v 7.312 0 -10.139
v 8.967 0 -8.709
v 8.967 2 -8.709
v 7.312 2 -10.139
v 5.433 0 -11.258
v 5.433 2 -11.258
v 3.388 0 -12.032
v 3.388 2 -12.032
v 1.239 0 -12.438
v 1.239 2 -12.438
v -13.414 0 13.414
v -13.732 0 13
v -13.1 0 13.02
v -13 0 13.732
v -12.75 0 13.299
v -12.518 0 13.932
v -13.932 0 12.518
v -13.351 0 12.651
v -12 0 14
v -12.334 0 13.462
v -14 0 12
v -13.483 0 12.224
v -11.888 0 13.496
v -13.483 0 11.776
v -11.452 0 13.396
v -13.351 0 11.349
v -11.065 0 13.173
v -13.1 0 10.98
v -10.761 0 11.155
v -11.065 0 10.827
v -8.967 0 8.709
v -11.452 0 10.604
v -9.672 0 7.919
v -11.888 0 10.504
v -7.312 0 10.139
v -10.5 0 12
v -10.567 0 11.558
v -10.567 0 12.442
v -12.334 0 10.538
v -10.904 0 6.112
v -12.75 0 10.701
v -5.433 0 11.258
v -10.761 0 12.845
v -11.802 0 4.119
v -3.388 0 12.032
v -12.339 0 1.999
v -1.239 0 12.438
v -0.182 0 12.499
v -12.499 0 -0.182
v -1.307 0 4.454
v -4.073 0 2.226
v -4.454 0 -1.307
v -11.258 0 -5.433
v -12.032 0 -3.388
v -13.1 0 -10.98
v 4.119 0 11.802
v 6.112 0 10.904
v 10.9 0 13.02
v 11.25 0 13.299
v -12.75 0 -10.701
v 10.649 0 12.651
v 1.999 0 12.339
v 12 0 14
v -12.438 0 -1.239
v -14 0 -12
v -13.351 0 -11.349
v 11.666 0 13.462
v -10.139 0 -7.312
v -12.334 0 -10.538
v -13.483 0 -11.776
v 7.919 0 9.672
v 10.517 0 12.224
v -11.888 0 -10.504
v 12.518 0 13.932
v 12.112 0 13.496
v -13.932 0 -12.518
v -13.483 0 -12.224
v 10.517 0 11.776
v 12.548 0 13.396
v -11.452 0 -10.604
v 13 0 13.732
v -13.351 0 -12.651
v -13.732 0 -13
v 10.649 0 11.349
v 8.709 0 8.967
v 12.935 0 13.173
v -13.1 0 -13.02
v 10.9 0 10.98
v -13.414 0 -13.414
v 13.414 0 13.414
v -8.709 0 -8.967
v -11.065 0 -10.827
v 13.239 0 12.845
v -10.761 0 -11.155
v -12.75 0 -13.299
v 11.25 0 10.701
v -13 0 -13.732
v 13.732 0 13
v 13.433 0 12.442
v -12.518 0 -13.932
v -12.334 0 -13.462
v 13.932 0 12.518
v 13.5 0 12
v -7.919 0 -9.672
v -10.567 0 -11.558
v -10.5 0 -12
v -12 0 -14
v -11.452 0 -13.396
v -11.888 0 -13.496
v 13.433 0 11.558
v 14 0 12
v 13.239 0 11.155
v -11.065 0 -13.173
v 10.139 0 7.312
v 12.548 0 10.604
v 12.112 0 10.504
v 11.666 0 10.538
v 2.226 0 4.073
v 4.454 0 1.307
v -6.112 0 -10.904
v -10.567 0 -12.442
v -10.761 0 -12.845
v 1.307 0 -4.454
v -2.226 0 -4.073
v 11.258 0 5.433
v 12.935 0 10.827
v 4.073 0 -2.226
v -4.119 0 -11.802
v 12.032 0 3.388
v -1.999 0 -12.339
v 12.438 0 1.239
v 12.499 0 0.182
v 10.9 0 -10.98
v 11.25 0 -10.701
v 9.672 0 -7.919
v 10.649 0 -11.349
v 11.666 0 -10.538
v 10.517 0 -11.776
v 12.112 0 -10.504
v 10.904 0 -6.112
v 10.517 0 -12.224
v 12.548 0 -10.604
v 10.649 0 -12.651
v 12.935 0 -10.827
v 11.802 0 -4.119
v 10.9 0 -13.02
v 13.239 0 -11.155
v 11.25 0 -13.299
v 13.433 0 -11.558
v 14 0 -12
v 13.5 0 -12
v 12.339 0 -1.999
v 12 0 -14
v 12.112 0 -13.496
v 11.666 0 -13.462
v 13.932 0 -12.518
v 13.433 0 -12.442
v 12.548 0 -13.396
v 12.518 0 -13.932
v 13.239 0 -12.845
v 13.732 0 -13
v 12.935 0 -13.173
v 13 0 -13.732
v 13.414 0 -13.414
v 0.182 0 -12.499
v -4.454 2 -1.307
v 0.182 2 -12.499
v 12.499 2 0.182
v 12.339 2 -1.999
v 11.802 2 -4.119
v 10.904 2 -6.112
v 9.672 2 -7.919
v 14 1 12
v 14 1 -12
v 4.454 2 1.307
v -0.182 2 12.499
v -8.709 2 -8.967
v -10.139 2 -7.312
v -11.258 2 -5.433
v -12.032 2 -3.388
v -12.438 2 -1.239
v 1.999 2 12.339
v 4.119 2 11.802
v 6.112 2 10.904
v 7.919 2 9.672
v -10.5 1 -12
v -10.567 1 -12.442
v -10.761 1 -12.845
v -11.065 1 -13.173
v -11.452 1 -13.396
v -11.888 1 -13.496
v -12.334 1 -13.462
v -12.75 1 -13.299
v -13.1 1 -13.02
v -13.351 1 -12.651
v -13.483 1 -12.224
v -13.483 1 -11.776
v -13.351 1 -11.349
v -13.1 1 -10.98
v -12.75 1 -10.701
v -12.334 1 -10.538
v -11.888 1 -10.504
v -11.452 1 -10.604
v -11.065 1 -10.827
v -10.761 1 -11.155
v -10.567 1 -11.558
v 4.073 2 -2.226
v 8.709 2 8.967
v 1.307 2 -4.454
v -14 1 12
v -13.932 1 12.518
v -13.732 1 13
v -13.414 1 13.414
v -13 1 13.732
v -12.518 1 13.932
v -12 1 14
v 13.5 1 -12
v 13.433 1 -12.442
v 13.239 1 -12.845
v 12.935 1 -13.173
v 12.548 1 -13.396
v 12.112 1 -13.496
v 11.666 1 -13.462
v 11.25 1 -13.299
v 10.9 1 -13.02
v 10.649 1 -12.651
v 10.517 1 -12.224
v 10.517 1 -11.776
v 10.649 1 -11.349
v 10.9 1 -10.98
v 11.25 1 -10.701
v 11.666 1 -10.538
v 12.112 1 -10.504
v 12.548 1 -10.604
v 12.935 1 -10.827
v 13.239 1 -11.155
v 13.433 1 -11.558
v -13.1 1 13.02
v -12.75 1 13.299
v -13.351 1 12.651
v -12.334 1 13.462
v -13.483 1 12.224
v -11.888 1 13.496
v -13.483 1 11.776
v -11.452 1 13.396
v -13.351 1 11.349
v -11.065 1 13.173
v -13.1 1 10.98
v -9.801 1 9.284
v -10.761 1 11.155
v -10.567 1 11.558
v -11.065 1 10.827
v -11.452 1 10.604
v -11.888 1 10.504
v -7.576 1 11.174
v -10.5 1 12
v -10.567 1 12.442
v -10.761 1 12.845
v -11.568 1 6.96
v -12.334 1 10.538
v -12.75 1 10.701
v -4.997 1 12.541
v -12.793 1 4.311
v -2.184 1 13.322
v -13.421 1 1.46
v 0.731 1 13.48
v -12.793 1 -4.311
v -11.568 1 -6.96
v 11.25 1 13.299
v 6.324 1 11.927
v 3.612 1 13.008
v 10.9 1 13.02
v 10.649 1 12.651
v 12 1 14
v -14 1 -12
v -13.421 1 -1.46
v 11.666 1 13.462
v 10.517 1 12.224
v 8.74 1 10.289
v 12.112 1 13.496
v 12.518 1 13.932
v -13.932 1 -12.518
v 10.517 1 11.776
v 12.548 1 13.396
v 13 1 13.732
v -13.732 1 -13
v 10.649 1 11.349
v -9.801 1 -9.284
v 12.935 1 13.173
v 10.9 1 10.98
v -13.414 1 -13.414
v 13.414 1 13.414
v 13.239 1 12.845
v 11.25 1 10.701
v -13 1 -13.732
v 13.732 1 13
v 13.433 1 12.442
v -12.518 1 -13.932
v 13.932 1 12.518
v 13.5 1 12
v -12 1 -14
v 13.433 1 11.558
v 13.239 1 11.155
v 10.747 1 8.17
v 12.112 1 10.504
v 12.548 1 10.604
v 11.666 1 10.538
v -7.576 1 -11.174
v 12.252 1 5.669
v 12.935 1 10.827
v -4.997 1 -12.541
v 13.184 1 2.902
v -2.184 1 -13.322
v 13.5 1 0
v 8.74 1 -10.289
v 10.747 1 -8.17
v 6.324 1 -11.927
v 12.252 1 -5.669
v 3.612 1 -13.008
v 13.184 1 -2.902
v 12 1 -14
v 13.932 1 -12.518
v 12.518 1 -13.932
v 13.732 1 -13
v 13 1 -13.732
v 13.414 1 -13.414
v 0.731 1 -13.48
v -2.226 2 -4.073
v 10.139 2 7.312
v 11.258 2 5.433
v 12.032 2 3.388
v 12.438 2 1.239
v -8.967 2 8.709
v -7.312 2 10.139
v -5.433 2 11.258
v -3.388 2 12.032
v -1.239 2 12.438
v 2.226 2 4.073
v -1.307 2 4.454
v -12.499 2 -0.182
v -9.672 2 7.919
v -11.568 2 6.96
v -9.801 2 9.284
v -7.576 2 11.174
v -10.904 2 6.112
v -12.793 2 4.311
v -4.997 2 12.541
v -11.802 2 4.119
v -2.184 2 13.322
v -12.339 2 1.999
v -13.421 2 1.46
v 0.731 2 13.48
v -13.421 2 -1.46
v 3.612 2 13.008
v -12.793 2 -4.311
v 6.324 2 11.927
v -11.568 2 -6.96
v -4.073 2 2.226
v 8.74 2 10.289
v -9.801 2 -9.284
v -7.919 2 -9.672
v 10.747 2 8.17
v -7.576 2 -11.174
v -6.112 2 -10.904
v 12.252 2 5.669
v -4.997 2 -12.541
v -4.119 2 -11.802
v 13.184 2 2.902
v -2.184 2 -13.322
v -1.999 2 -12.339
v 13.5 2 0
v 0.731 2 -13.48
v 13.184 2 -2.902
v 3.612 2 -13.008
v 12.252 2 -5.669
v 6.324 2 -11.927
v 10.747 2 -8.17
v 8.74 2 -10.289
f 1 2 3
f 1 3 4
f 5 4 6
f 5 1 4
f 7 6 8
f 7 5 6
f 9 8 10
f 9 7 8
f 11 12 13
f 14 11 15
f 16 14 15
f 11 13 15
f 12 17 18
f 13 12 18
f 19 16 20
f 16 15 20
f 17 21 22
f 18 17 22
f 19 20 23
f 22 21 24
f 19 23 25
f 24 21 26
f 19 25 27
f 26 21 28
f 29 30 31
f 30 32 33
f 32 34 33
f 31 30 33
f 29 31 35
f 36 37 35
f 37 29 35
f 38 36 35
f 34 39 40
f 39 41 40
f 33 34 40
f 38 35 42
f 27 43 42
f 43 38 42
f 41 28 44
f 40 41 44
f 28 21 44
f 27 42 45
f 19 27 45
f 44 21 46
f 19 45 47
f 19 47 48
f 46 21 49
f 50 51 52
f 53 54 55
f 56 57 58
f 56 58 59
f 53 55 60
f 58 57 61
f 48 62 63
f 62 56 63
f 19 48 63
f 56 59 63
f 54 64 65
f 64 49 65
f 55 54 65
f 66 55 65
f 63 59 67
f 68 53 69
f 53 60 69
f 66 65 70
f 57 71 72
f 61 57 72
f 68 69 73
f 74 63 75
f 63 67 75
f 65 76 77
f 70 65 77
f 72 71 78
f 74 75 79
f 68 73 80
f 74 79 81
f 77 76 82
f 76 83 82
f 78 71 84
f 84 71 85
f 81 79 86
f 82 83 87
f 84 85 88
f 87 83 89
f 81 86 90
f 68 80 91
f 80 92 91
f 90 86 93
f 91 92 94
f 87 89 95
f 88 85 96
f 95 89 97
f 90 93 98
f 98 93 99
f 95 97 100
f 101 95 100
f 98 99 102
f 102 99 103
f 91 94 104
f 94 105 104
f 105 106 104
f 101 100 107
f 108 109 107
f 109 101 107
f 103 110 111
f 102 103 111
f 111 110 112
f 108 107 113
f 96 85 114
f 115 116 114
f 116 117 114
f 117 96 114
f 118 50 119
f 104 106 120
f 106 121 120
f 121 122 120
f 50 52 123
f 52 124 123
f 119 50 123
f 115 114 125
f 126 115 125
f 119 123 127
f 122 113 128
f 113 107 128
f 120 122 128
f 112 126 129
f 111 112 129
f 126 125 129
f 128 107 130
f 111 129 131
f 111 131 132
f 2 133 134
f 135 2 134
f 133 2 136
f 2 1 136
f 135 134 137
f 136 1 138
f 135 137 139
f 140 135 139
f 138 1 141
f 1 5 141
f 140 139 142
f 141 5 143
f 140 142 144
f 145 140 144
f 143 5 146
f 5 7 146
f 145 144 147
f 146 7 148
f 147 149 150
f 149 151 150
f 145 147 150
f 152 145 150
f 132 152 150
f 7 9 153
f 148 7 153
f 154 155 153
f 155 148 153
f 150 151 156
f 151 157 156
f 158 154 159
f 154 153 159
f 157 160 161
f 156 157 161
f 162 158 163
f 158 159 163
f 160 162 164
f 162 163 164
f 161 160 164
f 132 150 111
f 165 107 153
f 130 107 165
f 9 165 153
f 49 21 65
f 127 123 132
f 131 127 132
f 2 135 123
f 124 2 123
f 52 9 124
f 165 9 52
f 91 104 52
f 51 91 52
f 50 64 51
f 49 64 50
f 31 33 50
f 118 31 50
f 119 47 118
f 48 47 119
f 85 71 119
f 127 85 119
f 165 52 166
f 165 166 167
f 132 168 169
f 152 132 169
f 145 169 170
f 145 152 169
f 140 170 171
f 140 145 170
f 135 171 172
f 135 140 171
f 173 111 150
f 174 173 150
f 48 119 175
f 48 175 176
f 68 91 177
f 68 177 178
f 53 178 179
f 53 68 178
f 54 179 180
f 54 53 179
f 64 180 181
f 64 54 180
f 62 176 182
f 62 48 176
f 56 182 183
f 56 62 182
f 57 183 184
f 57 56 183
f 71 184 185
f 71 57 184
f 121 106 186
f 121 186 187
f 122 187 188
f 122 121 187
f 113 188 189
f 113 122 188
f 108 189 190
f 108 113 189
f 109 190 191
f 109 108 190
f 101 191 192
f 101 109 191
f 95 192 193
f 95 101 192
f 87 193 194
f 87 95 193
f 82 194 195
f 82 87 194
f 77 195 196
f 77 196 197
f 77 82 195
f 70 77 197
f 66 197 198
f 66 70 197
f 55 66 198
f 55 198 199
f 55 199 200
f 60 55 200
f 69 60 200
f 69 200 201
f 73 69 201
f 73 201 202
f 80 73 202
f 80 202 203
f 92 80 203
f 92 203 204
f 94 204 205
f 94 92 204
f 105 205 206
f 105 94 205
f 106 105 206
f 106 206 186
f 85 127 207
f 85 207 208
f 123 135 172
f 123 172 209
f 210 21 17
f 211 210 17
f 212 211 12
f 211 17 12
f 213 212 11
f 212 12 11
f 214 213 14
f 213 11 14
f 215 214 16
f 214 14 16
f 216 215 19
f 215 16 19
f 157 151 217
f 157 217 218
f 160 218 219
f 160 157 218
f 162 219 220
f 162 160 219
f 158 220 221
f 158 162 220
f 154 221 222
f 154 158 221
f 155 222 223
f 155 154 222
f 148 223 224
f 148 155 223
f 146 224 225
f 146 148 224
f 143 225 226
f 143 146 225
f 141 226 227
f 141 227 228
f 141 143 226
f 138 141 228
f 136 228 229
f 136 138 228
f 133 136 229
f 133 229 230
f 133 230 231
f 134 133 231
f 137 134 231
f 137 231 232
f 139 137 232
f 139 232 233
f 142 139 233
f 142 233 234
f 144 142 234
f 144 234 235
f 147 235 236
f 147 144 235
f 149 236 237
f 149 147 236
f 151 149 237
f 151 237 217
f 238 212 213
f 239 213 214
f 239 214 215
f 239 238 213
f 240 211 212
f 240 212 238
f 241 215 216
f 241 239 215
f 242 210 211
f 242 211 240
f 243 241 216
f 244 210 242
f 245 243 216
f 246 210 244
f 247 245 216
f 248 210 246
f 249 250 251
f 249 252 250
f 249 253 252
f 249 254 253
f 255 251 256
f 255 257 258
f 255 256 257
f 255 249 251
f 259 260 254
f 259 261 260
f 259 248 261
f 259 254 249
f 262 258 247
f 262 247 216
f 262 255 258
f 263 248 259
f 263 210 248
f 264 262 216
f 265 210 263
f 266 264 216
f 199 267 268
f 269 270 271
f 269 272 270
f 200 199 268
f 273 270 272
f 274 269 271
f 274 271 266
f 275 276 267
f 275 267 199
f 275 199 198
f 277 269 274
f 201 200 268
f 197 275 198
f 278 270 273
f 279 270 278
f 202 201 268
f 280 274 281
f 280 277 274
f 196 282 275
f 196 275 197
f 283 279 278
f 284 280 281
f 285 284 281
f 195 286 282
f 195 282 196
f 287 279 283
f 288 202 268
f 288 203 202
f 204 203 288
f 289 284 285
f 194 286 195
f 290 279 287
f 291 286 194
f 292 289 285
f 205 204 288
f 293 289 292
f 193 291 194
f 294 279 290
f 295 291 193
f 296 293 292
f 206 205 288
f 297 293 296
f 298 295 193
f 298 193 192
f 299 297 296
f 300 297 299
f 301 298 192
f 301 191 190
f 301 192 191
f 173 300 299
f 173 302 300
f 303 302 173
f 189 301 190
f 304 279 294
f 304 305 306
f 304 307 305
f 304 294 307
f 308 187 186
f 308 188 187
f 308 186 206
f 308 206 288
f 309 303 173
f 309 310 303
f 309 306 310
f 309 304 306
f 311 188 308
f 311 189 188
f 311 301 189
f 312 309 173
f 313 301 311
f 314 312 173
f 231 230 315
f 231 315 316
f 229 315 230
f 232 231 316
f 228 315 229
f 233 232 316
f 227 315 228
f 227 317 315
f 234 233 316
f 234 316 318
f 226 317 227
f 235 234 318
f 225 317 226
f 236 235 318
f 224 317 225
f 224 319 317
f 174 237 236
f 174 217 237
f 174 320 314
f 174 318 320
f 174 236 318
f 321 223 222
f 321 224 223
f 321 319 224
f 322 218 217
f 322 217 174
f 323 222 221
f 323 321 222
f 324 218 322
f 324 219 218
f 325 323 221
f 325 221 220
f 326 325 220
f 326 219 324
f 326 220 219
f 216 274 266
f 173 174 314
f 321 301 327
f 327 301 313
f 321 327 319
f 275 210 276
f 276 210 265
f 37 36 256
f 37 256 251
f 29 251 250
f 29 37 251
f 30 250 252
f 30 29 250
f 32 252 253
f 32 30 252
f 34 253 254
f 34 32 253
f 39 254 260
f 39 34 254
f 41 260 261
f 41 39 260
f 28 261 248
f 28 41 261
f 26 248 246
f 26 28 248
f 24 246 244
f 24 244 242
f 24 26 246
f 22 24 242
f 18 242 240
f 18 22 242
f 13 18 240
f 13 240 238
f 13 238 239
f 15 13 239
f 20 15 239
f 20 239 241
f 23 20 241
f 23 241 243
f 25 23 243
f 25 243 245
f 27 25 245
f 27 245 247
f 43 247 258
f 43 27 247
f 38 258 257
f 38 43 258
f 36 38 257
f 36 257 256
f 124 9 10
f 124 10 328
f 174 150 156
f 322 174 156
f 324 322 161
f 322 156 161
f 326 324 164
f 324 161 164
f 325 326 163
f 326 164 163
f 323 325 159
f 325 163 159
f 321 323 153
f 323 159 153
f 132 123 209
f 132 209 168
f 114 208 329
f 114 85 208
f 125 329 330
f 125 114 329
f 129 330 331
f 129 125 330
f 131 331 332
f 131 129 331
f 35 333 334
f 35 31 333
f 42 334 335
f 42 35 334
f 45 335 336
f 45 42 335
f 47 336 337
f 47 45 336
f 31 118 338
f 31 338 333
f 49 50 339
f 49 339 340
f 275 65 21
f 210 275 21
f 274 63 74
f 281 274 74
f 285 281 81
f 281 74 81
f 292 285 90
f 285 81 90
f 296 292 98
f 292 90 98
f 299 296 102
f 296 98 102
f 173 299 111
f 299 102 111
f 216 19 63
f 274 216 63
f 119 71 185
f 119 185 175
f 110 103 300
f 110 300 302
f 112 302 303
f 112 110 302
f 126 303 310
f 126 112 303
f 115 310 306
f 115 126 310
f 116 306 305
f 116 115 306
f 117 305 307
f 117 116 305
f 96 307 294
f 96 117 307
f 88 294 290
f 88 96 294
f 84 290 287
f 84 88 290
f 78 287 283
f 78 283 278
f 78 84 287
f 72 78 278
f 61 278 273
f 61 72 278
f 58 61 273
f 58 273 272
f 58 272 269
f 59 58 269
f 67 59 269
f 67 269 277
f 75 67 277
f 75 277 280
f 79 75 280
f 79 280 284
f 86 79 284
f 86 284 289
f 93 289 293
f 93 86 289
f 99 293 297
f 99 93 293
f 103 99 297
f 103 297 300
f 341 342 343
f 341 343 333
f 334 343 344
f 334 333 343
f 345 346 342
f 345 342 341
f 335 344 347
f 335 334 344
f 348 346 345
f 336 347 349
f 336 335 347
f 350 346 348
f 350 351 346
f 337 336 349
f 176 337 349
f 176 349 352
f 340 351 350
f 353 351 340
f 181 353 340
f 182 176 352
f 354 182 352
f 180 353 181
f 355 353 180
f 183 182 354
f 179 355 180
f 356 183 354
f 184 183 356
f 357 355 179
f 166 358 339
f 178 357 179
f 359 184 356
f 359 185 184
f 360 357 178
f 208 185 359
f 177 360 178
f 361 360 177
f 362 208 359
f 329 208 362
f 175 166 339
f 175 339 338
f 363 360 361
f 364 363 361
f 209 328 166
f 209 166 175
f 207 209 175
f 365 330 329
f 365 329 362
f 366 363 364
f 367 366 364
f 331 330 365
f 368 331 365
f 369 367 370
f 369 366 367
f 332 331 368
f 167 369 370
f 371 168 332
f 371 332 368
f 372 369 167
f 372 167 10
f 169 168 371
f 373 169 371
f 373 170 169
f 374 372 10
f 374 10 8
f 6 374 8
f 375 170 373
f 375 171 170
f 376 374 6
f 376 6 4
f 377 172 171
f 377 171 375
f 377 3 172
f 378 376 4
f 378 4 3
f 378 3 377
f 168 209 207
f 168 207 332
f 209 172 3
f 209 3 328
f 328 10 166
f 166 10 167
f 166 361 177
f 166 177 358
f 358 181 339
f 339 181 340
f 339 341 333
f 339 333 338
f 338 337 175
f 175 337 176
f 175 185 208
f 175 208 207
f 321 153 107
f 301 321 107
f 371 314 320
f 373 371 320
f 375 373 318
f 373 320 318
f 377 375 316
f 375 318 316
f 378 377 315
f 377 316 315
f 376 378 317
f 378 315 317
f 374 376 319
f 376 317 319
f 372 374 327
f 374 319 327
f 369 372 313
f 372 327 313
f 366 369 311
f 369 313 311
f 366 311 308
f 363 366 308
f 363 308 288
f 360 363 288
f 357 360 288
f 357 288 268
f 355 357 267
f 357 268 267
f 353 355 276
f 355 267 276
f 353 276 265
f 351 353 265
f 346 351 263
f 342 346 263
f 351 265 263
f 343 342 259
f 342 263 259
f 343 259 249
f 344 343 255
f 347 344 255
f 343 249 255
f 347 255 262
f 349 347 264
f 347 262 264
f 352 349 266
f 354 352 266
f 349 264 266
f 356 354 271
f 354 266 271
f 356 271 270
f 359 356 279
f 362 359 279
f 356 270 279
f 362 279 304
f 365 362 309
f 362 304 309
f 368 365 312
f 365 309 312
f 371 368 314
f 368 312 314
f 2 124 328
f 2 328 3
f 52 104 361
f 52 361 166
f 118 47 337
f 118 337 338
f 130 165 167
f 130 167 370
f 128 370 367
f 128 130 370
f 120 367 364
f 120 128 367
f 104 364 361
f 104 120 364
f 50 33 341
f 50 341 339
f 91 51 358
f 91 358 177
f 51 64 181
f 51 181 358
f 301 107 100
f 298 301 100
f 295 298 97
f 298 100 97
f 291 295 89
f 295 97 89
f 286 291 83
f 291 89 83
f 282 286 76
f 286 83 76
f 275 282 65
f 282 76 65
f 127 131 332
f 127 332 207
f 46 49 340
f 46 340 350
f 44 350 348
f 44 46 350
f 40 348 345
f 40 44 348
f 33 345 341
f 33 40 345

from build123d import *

# Parameters (mm, degrees)
SKETCH1_R           = 12.5
SKETCH1_R_2         = 1.5
BOSS_EXTRUDE1_DEPTH = 1
SKETCH3_R           = 13.5
SKETCH3_R_2         = 12.5
BOSS_EXTRUDE2_DEPTH = 1
BOSS_EXTRUDE3_DEPTH = 2


with BuildPart() as part:
    # Sketch1 → Boss-Extrude1 (new body)
    with BuildSketch(Plane(origin=(0, 0, 0), x_dir=(1, 0, 0), z_dir=(0, 1, 0))):
        with BuildLine():
            Line((-12, -14), (12, -14))
            ThreePointArc((12, -14), (13.414213562, -13.414213562), (14, -12))
            Line((14, -12), (14, 12))
            ThreePointArc((14, 12), (13.414213562, 13.414213562), (12, 14))
            Line((12, 14), (-12, 14))
            ThreePointArc((-12, 14), (-13.414213562, 13.414213562), (-14, 12))
            Line((-14, 12), (-14, -12))
            ThreePointArc((-14, -12), (-13.414213562, -13.414213562), (-12, -14))
        make_face()
        Circle(SKETCH1_R, mode=Mode.SUBTRACT)
        with Locations((-12, 12)):
            Circle(SKETCH1_R_2, mode=Mode.SUBTRACT)
        with Locations((12, 12)):
            Circle(SKETCH1_R_2, mode=Mode.SUBTRACT)
        with Locations((12, -12)):
            Circle(SKETCH1_R_2, mode=Mode.SUBTRACT)
        with Locations((-12, -12)):
            Circle(SKETCH1_R_2, mode=Mode.SUBTRACT)
    extrude(amount=BOSS_EXTRUDE1_DEPTH)

    # Sketch3 → Boss-Extrude2 (add)
    with BuildSketch(Plane(origin=(0, 1, 0), x_dir=(1, 0, 0), z_dir=(0, 1, 0))):
        Circle(SKETCH3_R)
        Circle(SKETCH3_R_2, mode=Mode.SUBTRACT)
    extrude(amount=BOSS_EXTRUDE2_DEPTH)

    # Sketch4 → Boss-Extrude3 (add)
    with BuildSketch(Plane(origin=(0, 0, 0), x_dir=(1, 0, 0), z_dir=(0, 1, 0))):
        with BuildLine():
            Line((-4.454043904, 1.306562965), (0.181881395, 12.498676696))
            ThreePointArc((0.181881395, 12.498676696), (0.711234958, 12.47974939), (1.239311378, 12.438412572))
            Line((1.239311378, 12.438412572), (-2.225605116, 4.073364181))
            Line((-2.225605116, 4.073364181), (8.966508616, 8.70928948))
            ThreePointArc((8.966508616, 8.70928948), (9.327434483, 8.321596359), (9.671611356, 7.918960398))
            Line((9.671611356, 7.918960398), (1.306562965, 4.454043904))
            Line((1.306562965, 4.454043904), (12.498676696, -0.181881395))
            ThreePointArc((12.498676696, -0.181881395), (12.47974939, -0.711234958), (12.438412572, -1.239311378))
            Line((12.438412572, -1.239311378), (4.073364181, 2.225605116))
            Line((4.073364181, 2.225605116), (8.70928948, -8.966508616))
            ThreePointArc((8.70928948, -8.966508616), (8.321596359, -9.327434483), (7.918960398, -9.671611356))
            Line((7.918960398, -9.671611356), (4.454043904, -1.306562965))
            Line((4.454043904, -1.306562965), (-0.181881395, -12.498676696))
            ThreePointArc((-0.181881395, -12.498676696), (-0.711234958, -12.47974939), (-1.239311378, -12.438412572))
            Line((-1.239311378, -12.438412572), (2.225605116, -4.073364181))
            Line((2.225605116, -4.073364181), (-8.966508616, -8.70928948))
            ThreePointArc((-8.966508616, -8.70928948), (-9.327434483, -8.321596359), (-9.671611356, -7.918960398))
            Line((-9.671611356, -7.918960398), (-1.306562965, -4.454043904))
            Line((-1.306562965, -4.454043904), (-12.498676696, 0.181881395))
            ThreePointArc((-12.498676696, 0.181881395), (-12.47974939, 0.711234958), (-12.438412572, 1.239311378))
            Line((-12.438412572, 1.239311378), (-4.073364181, -2.225605116))
            Line((-4.073364181, -2.225605116), (-8.70928948, 8.966508616))
            ThreePointArc((-8.70928948, 8.966508616), (-8.321596359, 9.327434483), (-7.918960398, 9.671611356))
            Line((-7.918960398, 9.671611356), (-4.454043904, 1.306562965))
        make_face()
    extrude(amount=BOSS_EXTRUDE3_DEPTH)


solid = part.part
